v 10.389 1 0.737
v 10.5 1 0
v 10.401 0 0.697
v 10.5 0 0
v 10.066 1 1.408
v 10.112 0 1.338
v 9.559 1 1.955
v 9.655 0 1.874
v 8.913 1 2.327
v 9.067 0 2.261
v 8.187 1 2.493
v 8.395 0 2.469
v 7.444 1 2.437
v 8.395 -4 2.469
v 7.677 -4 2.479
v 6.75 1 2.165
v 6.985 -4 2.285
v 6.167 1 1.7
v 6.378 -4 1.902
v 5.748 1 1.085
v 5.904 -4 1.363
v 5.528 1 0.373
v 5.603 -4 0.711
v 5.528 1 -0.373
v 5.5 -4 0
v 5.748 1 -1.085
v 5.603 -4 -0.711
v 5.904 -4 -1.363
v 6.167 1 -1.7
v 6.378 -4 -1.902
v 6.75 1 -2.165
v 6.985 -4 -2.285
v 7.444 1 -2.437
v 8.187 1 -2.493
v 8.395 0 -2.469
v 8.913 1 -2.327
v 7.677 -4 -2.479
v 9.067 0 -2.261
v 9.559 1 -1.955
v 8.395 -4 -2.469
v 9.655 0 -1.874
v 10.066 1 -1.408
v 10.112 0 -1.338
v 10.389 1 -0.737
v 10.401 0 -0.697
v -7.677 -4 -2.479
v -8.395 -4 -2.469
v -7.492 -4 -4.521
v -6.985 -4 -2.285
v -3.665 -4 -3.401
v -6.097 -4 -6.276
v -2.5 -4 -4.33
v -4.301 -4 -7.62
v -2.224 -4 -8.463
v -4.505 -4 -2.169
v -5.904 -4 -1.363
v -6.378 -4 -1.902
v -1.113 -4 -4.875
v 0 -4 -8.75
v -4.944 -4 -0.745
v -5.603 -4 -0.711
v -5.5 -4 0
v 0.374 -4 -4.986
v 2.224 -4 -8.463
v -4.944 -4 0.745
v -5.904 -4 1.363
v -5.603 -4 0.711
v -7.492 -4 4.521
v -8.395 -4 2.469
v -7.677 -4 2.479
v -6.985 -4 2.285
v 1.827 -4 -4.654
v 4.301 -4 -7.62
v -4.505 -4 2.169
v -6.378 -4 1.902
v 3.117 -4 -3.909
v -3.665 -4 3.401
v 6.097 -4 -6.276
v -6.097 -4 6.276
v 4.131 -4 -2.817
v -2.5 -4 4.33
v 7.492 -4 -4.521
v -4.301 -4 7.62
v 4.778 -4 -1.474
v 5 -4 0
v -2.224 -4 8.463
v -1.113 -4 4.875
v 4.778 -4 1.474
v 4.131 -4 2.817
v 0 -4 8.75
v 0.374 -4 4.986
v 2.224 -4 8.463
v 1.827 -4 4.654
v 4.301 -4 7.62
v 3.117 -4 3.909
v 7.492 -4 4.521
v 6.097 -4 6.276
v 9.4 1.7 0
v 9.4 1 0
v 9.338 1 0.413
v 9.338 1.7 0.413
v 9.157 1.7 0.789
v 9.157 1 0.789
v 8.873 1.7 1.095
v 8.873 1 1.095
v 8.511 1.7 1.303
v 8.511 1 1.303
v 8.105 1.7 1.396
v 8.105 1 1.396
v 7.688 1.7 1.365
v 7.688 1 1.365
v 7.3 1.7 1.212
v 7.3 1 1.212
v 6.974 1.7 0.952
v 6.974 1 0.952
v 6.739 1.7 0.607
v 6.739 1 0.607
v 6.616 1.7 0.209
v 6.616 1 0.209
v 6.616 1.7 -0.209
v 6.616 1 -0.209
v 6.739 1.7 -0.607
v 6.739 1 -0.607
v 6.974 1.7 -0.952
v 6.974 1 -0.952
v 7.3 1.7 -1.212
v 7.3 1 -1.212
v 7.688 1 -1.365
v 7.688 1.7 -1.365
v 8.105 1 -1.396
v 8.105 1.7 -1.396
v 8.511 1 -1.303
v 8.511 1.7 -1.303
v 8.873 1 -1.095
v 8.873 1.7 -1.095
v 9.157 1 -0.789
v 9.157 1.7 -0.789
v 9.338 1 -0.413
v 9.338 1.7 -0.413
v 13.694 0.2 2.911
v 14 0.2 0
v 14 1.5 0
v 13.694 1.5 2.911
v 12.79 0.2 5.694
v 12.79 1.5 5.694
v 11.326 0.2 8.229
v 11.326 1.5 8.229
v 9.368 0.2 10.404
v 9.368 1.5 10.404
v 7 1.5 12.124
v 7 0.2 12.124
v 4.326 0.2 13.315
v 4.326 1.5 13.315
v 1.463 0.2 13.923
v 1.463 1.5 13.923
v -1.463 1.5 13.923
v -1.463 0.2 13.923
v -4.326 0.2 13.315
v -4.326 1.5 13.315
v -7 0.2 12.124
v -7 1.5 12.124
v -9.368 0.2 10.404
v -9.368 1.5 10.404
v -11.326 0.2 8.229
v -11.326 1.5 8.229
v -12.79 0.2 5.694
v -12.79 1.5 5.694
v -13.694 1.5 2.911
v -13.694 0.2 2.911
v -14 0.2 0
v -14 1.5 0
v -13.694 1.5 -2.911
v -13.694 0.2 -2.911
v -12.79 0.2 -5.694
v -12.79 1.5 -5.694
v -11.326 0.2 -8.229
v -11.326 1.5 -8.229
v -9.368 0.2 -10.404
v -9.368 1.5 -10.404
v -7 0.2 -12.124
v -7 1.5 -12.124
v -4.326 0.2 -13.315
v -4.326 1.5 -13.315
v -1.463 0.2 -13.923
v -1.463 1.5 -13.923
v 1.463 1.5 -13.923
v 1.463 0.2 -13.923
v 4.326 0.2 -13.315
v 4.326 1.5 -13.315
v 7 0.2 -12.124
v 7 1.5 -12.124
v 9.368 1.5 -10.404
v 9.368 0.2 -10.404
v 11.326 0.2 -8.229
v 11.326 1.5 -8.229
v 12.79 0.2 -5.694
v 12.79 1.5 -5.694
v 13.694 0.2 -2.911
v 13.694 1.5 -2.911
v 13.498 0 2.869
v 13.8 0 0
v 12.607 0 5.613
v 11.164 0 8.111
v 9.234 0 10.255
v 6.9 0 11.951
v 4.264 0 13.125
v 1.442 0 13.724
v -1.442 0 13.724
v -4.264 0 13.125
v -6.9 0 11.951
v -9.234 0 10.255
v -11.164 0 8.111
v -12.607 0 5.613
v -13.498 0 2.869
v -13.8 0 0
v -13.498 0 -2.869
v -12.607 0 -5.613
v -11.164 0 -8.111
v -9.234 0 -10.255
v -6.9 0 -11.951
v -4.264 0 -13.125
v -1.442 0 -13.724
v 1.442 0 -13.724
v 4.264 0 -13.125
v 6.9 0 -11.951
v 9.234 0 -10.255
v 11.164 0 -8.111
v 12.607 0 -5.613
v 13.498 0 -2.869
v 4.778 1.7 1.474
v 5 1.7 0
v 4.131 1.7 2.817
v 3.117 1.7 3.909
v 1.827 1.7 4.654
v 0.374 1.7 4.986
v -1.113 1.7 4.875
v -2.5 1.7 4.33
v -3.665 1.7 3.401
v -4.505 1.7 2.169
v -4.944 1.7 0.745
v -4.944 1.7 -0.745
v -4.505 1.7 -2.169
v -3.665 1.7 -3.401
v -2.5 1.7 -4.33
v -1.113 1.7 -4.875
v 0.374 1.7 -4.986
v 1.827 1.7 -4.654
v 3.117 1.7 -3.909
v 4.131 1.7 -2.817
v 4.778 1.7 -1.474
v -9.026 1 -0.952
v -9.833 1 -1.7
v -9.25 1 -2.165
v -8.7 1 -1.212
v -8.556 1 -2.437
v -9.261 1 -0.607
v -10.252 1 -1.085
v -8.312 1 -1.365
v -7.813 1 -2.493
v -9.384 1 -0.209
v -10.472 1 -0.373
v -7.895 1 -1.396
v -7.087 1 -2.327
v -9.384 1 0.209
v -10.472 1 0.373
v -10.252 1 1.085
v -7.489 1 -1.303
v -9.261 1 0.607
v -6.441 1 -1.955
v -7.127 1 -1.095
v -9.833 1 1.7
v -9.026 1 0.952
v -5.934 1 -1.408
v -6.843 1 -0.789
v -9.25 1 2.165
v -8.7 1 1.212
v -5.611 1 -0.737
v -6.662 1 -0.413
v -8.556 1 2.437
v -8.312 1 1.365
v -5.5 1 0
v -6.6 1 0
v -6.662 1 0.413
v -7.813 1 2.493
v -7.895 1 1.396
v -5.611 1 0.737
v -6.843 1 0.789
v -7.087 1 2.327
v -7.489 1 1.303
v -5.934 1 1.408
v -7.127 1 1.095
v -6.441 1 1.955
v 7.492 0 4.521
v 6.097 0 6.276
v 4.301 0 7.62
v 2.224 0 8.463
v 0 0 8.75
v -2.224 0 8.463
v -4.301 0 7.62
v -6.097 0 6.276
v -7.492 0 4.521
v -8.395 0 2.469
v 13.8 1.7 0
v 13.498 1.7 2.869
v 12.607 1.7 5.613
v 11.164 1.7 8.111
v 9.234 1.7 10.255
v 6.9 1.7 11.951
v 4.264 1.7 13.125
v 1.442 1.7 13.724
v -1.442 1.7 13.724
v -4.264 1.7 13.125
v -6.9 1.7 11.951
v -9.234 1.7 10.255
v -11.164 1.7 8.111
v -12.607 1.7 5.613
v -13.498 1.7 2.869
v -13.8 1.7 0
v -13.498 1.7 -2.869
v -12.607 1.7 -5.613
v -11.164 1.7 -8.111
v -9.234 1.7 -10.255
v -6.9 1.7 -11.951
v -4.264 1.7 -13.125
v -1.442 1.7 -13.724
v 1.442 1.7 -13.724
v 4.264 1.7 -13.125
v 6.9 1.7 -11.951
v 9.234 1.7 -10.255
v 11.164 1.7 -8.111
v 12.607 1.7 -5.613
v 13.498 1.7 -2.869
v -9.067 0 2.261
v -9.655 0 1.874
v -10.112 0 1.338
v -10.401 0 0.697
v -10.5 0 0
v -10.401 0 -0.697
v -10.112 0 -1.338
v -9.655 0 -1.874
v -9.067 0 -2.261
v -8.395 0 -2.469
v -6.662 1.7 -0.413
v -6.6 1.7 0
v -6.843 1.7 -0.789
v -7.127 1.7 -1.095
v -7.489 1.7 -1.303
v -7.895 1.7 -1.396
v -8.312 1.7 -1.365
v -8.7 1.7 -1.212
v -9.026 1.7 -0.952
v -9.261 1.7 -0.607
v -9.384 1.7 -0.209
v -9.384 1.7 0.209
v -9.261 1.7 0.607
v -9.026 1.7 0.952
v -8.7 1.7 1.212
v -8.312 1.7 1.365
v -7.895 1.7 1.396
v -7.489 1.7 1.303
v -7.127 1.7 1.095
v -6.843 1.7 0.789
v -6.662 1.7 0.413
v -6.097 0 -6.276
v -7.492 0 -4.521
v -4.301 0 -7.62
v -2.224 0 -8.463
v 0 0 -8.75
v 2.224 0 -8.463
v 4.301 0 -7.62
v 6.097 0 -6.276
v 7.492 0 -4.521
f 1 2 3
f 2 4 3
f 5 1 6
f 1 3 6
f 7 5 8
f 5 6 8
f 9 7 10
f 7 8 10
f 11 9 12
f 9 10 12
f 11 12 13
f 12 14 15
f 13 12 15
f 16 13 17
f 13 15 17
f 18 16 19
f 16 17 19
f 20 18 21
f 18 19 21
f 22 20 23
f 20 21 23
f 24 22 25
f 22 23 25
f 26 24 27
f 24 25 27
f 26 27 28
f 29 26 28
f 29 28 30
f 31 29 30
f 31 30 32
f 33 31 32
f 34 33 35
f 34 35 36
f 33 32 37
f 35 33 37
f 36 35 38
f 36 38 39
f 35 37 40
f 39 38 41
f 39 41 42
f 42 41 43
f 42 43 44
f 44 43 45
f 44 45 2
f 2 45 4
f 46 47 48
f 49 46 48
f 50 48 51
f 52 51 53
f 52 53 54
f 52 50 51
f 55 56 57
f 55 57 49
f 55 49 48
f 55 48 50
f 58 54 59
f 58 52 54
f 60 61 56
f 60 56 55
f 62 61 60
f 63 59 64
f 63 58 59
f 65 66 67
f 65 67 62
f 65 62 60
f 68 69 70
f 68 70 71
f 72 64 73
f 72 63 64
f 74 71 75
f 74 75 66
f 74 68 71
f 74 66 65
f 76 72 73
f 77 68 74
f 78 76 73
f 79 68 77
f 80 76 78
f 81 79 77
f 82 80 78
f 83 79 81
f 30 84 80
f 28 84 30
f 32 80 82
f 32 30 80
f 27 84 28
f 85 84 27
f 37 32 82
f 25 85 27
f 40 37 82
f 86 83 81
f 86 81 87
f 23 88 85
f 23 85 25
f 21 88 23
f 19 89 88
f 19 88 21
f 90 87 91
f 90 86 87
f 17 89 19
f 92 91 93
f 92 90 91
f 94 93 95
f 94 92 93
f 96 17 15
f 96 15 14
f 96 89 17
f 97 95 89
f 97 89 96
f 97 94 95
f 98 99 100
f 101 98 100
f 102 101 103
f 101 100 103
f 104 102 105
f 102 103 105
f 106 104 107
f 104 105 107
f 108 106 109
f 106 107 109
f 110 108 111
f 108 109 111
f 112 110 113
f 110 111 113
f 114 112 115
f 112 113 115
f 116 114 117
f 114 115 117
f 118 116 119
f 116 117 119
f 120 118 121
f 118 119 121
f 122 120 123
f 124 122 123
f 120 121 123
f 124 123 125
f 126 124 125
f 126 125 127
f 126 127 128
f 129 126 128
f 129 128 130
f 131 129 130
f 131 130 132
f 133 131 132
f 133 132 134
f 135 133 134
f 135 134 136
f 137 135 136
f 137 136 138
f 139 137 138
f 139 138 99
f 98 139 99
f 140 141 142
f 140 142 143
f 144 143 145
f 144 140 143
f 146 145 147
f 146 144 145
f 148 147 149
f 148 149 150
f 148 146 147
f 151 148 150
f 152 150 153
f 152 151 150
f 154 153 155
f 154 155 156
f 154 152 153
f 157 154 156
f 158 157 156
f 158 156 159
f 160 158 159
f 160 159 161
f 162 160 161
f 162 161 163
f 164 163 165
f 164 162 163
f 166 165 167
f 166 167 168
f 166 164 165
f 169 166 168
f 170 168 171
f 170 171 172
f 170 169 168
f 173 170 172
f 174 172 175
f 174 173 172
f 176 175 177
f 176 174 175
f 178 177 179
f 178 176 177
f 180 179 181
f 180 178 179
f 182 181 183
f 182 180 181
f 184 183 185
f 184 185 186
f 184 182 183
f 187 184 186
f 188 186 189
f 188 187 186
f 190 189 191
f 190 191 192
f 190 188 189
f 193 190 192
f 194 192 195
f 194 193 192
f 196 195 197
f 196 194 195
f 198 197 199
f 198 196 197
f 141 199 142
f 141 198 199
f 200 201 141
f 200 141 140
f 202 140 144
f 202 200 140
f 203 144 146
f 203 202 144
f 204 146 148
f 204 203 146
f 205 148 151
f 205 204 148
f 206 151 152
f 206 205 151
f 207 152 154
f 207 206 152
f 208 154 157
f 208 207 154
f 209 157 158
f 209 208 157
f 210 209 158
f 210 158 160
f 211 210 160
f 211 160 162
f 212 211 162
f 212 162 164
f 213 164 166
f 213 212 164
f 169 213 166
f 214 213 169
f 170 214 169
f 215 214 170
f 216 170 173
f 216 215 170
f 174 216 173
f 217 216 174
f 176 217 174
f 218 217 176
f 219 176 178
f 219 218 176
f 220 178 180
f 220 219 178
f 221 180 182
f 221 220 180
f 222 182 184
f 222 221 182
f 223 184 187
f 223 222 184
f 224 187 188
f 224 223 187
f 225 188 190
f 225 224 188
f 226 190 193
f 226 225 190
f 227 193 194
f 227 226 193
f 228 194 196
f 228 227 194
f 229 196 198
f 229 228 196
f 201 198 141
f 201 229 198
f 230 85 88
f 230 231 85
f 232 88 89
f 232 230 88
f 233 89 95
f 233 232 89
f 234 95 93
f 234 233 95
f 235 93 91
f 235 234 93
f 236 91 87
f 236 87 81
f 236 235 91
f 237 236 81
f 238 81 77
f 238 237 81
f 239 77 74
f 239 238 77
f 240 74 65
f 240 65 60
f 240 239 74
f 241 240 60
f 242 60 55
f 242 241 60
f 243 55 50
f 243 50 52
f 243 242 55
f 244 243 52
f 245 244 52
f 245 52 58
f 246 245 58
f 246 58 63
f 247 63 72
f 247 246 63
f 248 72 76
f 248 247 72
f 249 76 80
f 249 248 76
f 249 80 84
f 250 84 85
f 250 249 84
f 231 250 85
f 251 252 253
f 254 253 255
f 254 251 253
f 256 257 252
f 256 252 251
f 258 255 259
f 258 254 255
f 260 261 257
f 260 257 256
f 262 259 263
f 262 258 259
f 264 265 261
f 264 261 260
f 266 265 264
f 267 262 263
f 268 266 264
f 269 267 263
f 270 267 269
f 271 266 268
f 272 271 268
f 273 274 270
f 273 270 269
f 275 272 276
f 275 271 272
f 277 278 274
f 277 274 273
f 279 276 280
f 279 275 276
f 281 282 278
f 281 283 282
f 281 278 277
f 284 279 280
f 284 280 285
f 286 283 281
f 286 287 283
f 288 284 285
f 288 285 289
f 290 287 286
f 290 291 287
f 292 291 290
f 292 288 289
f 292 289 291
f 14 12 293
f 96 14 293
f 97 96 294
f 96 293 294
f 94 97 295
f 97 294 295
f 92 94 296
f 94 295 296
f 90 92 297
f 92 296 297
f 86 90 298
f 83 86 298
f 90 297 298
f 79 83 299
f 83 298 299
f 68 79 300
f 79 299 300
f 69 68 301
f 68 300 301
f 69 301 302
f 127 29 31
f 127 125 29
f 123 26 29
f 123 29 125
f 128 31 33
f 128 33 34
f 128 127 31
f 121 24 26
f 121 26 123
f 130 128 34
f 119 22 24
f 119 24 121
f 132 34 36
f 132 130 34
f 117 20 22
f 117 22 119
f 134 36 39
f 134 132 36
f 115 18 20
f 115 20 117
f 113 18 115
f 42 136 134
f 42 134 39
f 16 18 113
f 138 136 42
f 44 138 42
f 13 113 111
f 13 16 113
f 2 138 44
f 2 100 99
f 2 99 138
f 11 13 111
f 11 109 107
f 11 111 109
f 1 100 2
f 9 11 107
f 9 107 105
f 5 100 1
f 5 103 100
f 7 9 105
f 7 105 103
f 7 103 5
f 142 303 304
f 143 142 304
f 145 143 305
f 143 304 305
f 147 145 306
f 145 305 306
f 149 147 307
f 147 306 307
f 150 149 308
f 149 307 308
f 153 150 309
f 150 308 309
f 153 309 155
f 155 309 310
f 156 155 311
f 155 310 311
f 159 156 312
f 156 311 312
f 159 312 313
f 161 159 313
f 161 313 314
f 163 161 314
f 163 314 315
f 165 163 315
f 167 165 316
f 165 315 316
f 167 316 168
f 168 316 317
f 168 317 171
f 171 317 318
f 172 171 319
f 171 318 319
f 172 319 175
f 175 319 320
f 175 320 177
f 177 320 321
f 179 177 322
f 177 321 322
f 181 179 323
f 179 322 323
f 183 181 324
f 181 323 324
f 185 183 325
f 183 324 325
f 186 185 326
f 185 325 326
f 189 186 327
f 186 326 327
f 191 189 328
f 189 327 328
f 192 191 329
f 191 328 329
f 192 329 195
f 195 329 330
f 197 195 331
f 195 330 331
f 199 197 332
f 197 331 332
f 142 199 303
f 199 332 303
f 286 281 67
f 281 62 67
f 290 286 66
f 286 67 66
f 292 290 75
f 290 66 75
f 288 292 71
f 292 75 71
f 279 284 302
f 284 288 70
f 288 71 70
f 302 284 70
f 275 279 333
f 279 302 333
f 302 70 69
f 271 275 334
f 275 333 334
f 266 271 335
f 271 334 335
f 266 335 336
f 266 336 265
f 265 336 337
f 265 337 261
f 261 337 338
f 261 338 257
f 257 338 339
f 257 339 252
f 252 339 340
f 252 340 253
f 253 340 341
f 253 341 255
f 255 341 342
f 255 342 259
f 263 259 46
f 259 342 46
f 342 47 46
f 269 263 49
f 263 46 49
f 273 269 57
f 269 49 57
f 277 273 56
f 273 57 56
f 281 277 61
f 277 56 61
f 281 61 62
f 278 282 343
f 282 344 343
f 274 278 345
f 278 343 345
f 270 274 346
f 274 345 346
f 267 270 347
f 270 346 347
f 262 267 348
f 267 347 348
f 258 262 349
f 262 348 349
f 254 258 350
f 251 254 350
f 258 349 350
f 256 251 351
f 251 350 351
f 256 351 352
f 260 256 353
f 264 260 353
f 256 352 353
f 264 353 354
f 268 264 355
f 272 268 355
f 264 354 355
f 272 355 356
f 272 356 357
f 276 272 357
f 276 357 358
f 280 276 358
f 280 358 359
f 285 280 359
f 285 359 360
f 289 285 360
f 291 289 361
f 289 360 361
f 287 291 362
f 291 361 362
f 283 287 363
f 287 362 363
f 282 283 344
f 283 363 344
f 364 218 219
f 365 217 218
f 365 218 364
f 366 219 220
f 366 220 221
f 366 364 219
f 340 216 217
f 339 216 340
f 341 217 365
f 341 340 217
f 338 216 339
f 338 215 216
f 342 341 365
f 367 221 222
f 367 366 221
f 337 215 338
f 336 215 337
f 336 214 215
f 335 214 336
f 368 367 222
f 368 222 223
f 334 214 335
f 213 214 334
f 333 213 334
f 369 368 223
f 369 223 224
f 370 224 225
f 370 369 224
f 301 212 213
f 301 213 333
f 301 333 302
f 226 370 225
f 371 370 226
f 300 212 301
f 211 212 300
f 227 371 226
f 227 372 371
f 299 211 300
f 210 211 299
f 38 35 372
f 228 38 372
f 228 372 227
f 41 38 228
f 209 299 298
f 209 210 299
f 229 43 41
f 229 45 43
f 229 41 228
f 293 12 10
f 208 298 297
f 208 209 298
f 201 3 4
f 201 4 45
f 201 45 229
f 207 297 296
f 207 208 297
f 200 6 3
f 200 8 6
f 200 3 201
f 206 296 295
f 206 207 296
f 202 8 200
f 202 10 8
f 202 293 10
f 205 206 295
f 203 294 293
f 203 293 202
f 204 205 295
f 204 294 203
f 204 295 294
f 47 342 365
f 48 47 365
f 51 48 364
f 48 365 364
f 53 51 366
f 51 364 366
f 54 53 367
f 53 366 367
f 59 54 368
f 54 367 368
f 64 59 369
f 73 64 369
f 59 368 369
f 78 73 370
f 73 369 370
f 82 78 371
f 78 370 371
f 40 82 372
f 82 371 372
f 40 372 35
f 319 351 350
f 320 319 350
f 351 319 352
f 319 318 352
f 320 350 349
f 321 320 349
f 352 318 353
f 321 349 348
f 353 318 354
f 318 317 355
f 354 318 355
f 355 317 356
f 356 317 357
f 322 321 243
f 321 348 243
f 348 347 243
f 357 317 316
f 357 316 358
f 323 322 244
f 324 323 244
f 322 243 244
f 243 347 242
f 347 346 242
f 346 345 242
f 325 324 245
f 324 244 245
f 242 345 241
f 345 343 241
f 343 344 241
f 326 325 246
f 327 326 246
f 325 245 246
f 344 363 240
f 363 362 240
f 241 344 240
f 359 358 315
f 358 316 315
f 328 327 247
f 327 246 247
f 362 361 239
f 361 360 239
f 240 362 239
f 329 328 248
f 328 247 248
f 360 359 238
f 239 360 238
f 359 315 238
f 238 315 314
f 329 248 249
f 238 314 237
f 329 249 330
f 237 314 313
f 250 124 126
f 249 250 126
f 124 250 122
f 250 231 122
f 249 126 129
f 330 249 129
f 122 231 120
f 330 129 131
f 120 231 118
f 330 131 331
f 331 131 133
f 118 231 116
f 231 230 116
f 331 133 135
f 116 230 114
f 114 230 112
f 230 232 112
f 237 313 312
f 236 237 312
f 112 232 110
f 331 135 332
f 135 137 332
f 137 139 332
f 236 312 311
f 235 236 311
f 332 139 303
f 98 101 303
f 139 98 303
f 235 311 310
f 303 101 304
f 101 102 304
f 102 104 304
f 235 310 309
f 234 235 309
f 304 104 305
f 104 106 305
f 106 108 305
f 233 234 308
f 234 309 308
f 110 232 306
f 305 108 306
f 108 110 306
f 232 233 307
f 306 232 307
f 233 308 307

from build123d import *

# Parameters (mm, degrees)
F0_R          = 14
F0_R_2        = 1.4
F0_R_3        = 5
F1_DEPTH      = 1.7
F2_SIZE       = 0.2
F3_R          = 5
F4_DEPTH      = 4
F5_R          = 2.5
F6_DEPTH      = 1
F6_DEPTH_BACK = 4.001


with BuildPart() as f1:
    # F0 (on Front) → F1 (new body)
    with BuildSketch(Plane.XZ):
        Circle(F0_R)
        with Locations((-8, 0)):
            Circle(F0_R_2, mode=Mode.SUBTRACT)
        Circle(F0_R_3, mode=Mode.SUBTRACT)
        with Locations((8, 0)):
            Circle(F0_R_2, mode=Mode.SUBTRACT)
    extrude(amount=-F1_DEPTH)

    # F2
    f2_edges = [f1.edges().sort_by_distance(p)[0] for p in [
        (-14, 1.7, 0),
        (-14, 0, 0),
    ]]
    chamfer(f2_edges, length=F2_SIZE)

    # F3 (on face) → F4 (join)
    with BuildSketch(Plane.XZ):
        with BuildLine():
            ThreePointArc((-8.66265625, 1.2332423502), (-6.6, 0), (-8.66265625, -1.2332423502))
            ThreePointArc((-8.66265625, -1.2332423502), (0, -8.75), (8.66265625, -1.2332423502))
            ThreePointArc((8.66265625, -1.2332423502), (6.6, 0), (8.66265625, 1.2332423502))
            ThreePointArc((8.66265625, 1.2332423502), (0, 8.75), (-8.66265625, 1.2332423502))
        make_face()
        Circle(F3_R, mode=Mode.SUBTRACT)
    extrude(amount=F4_DEPTH)

    # F5 (on face) → F6 (cut, two sides)
    with BuildSketch(Plane.XZ) as f6_sk:
        with Locations((-8, 0)):
            Circle(F5_R)
        with Locations((8, 0)):
            Circle(F5_R)
    extrude(amount=-F6_DEPTH, mode=Mode.SUBTRACT)
    extrude(f6_sk.sketch, amount=F6_DEPTH_BACK, mode=Mode.SUBTRACT)


solid = f1.part
